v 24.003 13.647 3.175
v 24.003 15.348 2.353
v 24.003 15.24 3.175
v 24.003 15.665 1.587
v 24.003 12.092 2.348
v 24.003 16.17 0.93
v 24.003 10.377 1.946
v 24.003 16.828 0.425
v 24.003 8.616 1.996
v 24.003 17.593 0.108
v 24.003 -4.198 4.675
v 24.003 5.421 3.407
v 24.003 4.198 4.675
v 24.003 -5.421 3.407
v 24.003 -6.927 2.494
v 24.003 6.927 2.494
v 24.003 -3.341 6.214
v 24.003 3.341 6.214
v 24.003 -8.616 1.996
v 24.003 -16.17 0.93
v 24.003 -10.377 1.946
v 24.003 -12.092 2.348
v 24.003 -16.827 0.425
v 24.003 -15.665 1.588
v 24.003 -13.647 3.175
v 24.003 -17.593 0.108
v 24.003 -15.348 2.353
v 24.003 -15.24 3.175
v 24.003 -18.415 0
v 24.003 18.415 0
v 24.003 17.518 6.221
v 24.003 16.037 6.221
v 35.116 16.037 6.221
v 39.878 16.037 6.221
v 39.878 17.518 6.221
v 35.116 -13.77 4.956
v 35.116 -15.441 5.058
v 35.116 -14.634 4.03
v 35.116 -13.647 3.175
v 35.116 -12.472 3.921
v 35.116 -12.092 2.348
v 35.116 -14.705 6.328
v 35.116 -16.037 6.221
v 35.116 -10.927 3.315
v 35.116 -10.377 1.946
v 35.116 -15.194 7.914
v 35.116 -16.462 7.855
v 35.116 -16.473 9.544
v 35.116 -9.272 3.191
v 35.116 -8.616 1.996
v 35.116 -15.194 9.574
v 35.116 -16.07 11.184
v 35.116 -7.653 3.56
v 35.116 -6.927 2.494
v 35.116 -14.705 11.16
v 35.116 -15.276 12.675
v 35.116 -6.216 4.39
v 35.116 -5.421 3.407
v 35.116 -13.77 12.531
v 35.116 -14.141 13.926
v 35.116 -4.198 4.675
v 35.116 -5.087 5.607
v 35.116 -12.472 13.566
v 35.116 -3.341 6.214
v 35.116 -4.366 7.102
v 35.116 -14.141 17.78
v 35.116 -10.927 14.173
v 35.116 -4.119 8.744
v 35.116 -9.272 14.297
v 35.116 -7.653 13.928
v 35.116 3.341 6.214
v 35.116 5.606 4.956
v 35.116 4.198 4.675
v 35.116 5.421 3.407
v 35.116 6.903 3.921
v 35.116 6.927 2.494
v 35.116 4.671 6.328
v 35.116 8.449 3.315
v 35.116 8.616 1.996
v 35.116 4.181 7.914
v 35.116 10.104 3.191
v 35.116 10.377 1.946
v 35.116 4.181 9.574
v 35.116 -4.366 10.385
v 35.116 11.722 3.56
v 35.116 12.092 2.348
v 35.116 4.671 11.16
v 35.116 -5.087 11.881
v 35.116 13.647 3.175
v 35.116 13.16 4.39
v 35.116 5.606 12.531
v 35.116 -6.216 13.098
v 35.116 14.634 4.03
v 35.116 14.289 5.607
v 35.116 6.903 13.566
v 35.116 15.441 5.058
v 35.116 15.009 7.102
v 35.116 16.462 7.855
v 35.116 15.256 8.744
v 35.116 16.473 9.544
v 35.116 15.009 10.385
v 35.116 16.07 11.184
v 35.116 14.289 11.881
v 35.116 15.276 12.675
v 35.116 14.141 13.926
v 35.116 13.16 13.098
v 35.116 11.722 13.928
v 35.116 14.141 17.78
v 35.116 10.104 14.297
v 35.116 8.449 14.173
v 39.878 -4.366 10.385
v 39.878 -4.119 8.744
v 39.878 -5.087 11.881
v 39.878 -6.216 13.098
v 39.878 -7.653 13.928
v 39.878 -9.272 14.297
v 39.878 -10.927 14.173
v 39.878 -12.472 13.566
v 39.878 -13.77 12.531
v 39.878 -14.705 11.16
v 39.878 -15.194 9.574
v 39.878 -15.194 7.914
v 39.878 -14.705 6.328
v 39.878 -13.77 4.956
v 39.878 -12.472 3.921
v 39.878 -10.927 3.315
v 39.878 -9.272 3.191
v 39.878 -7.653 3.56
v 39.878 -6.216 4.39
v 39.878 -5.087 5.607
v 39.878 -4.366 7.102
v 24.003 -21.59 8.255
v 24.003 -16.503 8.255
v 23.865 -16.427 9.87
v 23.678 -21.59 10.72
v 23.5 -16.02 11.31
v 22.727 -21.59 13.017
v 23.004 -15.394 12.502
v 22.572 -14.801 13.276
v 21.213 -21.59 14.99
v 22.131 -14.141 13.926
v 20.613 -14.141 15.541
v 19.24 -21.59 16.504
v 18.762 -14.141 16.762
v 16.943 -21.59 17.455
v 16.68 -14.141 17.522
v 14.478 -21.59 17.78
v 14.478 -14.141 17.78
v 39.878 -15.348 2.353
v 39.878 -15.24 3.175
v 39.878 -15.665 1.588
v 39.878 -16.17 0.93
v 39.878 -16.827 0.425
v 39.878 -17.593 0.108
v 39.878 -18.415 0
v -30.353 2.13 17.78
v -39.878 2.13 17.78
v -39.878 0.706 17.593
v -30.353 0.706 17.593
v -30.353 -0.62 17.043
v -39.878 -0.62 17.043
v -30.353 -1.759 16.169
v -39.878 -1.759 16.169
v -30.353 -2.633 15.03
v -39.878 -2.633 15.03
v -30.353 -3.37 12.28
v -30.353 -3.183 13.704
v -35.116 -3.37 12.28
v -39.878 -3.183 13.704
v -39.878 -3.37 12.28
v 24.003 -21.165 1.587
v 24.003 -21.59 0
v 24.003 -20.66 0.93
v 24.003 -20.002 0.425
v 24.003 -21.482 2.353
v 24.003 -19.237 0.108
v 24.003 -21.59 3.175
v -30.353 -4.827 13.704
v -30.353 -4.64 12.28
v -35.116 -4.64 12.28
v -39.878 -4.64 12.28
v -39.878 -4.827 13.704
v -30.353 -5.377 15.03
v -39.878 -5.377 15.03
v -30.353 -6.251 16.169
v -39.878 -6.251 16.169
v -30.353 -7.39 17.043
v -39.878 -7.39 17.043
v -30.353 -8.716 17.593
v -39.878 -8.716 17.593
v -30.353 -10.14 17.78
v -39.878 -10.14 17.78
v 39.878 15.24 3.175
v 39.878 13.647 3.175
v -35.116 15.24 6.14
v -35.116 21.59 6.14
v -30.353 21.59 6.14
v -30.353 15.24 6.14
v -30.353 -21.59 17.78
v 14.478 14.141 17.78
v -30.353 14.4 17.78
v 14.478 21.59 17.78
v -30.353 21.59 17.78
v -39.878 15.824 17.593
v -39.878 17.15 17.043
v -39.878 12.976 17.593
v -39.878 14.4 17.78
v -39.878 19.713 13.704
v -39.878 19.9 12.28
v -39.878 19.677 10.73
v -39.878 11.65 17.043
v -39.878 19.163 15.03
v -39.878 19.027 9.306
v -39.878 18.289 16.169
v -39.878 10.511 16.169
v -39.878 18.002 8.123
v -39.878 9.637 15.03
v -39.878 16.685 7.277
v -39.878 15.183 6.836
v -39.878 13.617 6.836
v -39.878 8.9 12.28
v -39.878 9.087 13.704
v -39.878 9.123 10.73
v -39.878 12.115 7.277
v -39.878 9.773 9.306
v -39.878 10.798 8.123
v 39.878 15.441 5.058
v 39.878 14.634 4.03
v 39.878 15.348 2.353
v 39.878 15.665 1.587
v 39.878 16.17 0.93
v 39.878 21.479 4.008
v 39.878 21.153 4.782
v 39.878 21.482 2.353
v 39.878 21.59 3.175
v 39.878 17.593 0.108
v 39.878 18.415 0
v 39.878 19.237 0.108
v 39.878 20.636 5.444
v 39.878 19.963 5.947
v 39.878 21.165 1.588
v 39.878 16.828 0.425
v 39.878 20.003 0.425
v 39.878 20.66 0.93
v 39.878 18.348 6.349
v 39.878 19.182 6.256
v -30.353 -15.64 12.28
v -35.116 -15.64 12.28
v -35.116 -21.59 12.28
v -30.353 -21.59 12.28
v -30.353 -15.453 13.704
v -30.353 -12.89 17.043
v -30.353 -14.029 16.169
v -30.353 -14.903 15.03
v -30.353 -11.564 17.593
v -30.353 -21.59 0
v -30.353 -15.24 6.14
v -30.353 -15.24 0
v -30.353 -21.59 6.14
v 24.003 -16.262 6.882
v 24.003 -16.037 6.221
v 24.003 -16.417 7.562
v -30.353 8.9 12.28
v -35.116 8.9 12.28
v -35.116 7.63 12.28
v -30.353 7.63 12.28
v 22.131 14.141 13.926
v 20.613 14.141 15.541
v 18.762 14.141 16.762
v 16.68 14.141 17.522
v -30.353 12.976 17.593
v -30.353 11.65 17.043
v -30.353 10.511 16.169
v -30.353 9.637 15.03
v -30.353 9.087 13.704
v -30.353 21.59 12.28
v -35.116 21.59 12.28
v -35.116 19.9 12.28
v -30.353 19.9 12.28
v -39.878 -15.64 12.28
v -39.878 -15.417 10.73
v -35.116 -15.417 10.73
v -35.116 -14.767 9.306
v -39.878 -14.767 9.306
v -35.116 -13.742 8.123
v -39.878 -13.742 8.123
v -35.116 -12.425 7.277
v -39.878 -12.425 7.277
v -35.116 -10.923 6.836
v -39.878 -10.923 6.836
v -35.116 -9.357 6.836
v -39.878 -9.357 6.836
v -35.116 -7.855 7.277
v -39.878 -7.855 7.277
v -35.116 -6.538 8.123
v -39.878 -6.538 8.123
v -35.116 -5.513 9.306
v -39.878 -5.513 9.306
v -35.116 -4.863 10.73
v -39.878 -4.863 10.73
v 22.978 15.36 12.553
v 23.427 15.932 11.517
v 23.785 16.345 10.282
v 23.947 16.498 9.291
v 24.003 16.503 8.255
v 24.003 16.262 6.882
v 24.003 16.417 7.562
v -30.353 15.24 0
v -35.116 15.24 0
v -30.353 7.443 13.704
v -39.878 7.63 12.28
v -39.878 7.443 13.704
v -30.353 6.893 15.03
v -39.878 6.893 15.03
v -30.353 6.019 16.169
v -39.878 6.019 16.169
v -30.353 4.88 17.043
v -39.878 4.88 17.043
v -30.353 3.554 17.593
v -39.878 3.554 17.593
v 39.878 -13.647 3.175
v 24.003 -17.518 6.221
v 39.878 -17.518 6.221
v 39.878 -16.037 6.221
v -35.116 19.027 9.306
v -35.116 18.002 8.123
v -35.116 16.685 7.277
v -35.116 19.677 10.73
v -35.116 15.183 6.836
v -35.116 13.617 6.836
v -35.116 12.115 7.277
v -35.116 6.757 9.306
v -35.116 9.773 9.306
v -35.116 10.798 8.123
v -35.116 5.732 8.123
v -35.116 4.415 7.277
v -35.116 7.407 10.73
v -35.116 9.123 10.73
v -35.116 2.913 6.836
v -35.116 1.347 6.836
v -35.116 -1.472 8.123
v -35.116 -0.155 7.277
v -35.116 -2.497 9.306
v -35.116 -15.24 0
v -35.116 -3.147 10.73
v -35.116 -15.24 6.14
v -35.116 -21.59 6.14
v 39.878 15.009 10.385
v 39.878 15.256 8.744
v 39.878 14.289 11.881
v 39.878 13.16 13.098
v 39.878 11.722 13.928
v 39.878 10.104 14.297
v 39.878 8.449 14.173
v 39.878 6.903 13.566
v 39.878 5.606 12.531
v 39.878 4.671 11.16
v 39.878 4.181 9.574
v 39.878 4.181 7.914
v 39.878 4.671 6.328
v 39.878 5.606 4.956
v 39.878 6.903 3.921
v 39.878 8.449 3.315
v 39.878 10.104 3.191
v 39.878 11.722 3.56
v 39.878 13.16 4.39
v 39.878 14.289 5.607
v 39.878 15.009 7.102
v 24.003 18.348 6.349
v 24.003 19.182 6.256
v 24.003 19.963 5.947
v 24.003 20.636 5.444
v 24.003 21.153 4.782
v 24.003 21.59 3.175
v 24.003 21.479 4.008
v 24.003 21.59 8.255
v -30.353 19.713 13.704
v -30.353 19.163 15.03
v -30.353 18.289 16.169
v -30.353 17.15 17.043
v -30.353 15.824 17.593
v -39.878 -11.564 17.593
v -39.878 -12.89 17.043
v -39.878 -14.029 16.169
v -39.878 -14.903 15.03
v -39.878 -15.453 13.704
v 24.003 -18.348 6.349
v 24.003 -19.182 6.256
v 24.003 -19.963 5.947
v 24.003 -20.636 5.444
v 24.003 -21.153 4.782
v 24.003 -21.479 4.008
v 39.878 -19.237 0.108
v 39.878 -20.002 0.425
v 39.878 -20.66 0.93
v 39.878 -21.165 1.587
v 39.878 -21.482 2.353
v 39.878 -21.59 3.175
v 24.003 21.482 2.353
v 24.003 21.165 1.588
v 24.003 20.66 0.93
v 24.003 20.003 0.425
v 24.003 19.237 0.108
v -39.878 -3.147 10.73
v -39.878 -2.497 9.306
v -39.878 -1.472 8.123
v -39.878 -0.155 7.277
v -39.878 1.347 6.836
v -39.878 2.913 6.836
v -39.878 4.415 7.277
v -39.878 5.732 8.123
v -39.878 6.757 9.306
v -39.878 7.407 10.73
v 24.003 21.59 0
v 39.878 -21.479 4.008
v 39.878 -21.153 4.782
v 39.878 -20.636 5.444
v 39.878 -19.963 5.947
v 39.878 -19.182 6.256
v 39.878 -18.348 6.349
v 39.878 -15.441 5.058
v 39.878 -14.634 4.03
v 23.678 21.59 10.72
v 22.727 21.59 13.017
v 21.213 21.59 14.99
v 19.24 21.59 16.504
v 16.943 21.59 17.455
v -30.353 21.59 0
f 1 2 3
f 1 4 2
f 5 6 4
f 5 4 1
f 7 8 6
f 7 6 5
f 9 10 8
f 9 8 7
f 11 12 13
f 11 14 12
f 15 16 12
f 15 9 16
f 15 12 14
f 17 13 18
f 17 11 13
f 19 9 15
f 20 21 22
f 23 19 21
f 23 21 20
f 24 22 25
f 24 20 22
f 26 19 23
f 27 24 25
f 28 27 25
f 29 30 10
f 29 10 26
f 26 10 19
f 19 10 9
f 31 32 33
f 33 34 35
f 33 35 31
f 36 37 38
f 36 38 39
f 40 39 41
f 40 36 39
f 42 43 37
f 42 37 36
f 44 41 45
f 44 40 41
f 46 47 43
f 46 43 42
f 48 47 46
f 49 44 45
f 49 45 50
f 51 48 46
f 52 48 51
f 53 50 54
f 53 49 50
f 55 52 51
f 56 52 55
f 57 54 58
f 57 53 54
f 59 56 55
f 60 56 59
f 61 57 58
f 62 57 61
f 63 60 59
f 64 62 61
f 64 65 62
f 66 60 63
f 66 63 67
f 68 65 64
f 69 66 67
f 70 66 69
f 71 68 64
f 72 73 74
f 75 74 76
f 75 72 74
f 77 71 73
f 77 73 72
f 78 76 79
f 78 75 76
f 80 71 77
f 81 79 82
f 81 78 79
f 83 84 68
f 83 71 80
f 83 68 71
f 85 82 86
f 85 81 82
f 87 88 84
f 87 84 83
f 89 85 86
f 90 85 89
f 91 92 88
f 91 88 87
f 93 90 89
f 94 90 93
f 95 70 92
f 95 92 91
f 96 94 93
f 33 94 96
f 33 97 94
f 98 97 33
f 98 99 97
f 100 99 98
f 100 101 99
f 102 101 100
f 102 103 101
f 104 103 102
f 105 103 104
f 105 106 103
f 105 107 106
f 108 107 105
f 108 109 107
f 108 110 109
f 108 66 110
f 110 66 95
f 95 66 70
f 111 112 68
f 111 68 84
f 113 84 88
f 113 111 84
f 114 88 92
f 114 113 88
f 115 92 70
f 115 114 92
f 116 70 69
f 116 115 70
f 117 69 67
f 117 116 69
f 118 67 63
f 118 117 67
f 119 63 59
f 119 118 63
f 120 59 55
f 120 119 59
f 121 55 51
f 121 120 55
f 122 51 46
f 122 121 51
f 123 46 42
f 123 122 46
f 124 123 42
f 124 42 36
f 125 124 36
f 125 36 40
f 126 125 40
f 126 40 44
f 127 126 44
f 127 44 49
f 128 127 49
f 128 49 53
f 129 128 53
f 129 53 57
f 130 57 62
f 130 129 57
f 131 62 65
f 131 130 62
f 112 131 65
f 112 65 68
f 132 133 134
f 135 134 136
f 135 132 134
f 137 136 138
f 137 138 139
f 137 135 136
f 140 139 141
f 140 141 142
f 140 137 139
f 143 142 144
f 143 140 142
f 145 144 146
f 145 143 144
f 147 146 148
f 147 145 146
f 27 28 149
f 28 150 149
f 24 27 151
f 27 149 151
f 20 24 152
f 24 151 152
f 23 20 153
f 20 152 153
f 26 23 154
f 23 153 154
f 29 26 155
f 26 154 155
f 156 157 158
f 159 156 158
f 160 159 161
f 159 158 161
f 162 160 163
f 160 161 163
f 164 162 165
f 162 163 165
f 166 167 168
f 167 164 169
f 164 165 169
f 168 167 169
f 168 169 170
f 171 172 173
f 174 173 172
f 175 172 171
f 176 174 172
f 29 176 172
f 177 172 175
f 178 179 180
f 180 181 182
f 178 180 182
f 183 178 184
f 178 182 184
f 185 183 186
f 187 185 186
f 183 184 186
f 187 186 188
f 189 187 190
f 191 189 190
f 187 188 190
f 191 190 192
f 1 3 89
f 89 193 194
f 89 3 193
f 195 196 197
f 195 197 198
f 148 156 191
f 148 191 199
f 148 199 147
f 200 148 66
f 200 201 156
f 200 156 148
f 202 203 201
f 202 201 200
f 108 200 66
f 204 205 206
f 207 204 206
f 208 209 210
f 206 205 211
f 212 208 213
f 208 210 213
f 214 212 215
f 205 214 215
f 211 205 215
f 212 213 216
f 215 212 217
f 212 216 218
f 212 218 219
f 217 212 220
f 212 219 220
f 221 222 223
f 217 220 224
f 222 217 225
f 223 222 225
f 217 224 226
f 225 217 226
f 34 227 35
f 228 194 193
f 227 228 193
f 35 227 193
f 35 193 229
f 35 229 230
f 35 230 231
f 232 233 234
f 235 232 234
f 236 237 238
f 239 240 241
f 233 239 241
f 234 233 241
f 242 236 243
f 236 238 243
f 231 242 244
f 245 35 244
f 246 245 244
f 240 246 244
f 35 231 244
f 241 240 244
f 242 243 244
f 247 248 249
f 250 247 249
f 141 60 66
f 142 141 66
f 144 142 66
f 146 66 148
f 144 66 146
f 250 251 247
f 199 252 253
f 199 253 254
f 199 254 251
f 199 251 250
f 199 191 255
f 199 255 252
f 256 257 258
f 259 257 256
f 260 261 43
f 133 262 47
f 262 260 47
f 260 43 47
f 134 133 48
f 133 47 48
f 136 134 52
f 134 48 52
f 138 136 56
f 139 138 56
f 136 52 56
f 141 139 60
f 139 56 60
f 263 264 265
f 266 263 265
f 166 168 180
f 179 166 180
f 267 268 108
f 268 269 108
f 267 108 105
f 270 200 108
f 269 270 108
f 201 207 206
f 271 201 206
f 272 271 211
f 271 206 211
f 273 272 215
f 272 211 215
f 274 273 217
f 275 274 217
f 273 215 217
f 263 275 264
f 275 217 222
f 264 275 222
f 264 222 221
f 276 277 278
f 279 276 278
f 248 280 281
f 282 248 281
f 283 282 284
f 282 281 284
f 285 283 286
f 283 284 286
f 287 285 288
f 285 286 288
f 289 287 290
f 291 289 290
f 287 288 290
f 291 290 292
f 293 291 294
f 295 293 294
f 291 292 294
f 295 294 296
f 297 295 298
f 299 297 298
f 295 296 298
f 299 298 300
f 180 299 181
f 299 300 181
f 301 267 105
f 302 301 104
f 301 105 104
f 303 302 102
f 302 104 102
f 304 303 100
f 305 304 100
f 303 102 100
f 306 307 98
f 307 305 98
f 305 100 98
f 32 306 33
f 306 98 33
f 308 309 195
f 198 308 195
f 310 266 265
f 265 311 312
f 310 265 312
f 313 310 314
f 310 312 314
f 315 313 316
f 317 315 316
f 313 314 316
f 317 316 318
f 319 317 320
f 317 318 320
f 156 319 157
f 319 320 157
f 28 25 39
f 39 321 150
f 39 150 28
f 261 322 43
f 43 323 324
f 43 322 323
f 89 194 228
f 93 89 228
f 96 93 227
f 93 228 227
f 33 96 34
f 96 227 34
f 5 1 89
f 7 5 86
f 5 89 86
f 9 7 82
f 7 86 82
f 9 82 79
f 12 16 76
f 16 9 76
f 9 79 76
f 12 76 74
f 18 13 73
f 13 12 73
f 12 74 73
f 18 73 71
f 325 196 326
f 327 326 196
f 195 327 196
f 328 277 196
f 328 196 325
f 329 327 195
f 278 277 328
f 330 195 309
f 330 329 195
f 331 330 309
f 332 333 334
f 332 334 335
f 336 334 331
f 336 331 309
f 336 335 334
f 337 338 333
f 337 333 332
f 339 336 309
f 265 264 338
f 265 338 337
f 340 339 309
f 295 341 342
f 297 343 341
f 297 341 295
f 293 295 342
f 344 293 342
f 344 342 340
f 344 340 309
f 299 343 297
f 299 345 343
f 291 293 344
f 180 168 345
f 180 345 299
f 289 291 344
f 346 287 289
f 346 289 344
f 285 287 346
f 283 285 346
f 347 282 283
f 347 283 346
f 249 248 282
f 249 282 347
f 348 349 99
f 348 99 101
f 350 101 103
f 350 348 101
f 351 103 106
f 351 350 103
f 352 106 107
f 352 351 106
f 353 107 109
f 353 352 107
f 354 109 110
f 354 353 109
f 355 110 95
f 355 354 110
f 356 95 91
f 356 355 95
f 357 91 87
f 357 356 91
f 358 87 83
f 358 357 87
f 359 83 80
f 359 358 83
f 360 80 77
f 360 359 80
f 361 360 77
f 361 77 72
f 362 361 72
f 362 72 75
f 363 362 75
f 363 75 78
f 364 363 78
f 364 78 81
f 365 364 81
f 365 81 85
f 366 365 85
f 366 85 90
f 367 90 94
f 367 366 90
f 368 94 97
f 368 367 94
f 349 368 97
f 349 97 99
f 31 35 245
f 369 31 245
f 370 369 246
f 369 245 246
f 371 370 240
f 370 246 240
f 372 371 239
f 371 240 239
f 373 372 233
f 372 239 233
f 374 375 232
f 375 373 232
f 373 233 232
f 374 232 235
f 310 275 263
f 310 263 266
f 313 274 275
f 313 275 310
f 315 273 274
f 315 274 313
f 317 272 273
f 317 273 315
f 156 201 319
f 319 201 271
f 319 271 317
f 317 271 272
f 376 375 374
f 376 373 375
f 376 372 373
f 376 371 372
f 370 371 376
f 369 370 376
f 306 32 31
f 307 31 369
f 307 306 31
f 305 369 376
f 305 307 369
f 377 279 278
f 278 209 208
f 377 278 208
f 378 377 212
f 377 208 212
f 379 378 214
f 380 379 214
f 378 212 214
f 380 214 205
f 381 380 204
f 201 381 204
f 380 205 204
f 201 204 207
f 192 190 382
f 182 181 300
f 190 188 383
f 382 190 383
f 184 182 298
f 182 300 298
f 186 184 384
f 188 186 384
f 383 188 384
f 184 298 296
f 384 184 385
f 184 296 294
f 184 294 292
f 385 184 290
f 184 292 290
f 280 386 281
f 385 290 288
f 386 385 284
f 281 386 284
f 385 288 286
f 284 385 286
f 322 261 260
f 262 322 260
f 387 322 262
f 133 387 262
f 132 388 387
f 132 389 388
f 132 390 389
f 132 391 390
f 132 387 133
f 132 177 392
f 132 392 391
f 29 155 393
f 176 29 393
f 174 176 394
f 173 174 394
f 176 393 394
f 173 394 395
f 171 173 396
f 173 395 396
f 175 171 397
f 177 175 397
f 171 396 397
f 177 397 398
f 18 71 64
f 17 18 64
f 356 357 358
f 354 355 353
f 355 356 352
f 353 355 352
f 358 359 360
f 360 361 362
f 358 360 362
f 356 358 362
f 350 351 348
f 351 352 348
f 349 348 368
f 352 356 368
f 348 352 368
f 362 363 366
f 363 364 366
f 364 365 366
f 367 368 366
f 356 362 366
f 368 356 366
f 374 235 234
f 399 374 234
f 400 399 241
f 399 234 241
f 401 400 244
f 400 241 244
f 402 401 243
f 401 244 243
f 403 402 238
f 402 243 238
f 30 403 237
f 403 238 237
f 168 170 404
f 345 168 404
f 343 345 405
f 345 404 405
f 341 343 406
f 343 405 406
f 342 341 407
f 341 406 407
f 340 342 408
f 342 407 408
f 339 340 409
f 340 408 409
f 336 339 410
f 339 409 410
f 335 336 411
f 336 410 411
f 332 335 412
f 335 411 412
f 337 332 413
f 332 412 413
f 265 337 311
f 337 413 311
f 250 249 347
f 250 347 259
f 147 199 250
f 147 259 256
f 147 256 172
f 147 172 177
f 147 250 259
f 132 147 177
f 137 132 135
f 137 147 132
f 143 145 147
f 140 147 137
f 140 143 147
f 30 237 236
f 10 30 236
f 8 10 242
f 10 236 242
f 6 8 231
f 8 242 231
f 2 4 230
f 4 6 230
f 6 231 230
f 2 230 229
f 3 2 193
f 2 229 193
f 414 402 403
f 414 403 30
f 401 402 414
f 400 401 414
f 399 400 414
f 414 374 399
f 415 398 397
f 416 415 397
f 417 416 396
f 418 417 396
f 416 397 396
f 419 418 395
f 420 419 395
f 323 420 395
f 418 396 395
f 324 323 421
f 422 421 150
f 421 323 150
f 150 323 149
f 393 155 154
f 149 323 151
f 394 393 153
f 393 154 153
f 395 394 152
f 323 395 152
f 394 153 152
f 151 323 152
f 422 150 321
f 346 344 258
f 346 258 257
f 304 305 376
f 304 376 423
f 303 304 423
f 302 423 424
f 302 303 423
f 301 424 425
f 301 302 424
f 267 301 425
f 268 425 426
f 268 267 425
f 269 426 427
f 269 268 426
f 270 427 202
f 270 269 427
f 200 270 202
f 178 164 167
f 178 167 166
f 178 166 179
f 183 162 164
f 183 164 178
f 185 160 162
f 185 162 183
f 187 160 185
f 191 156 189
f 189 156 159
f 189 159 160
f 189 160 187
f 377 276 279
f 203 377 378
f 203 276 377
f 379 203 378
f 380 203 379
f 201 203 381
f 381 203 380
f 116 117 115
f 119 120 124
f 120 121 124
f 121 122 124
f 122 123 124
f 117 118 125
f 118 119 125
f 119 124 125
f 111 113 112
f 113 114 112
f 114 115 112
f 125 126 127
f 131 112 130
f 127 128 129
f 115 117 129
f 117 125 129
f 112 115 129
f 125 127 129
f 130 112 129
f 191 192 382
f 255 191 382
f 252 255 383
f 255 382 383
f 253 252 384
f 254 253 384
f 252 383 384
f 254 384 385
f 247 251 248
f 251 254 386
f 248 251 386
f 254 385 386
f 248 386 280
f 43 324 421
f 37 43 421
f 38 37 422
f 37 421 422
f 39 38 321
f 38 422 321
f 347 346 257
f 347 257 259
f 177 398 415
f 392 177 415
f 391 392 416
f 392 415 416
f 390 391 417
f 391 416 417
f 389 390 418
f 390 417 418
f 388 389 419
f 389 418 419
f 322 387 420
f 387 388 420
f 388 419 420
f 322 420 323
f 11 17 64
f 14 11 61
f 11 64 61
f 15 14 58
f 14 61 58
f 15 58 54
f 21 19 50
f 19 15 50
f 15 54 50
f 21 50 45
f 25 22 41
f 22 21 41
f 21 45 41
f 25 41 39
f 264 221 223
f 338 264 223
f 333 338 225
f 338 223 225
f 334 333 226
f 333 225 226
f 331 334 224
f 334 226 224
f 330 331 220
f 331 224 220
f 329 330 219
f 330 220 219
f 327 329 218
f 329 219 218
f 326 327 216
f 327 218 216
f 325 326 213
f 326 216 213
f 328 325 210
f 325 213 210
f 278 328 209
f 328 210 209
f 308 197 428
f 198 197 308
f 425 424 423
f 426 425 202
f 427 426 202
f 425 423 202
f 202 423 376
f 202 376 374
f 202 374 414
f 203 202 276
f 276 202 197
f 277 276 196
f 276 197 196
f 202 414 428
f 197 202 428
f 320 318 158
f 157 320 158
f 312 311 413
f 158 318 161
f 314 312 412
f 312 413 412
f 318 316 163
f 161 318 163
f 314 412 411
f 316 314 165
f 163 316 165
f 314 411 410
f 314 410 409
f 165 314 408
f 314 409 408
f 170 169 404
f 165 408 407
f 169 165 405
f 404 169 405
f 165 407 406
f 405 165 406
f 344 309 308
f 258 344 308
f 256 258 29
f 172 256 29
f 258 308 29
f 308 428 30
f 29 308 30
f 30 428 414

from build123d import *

# Parameters (mm, degrees)
F1_DEPTH  = 17.78
F2_W      = 6.35
F2_H      = 6.1400055
F3_DEPTH  = 9.525
F2_W_2    = 30.48
F4_DEPTH  = 4.7625
F5_R      = 5.5687296145
F6_DEPTH  = 4.7625
F7_DEPTH  = 17.4625
F8_DEPTH  = 25.4
F9_DEPTH  = 15.875
F10_W     = 9.525
F10_H     = 5.08
F10_H_2   = 3.175
F11_DEPTH = 43.18


# Not quite as in the source:
# - a length typed as a fraction of an inch, garbled in the dataset ("3 / 203.2 mm" for 3/8 in), is restored
# - a feature names something its author has since deleted; it is built from what else it names


with BuildPart() as f1:
    # F0 (on Top) → F1 (new body)
    with BuildSketch(Plane.XY):
        Polygon((-39.878, 21.59), (-39.878, 0), (-39.878, -21.59), (39.878, -21.59), (39.878, 0), (39.878, 21.59), align=None)
    extrude(amount=F1_DEPTH)

    # F2 (on face) → F3 (cut)
    with BuildSketch(Plane(origin=(-39.878, 0, 0), x_dir=(0, -1, 0), z_dir=(-1, 0, 0))):
        with Locations((-18.415, 3.07000275)):
            Rectangle(F2_W, F2_H)
        with Locations((18.415, 3.07000275)):
            Rectangle(F2_W, F2_H)
        with BuildLine():
            Line((-21.59, 17.78), (-21.59, 12.28))
            Line((-21.59, 12.28), (-19.9, 12.28))
            ThreePointArc((-19.9, 12.28), (-18.2890872965, 16.1690872965), (-14.4, 17.78))
            Line((-14.4, 17.78), (-21.59, 17.78))
        make_face()
        with BuildLine():
            Line((-2.13, 17.78), (-14.4, 17.78))
            ThreePointArc((-14.4, 17.78), (-10.5109127035, 16.1690872965), (-8.9, 12.28))
            Line((-8.9, 12.28), (-7.63, 12.28))
            ThreePointArc((-7.63, 12.28), (-6.0190872965, 16.1690872965), (-2.13, 17.78))
        make_face()
        with BuildLine():
            Line((15.64, 12.28), (21.59, 12.28))
            Line((21.59, 12.28), (21.59, 17.78))
            Line((21.59, 17.78), (10.14, 17.78))
            ThreePointArc((10.14, 17.78), (14.0290872965, 16.1690872965), (15.64, 12.28))
        make_face()
        with BuildLine():
            Line((10.14, 17.78), (-2.13, 17.78))
            ThreePointArc((-2.13, 17.78), (1.7590872965, 16.1690872965), (3.37, 12.28))
            Line((3.37, 12.28), (4.64, 12.28))
            ThreePointArc((4.64, 12.28), (6.2509127035, 16.1690872965), (10.14, 17.78))
        make_face()
    extrude(amount=-F3_DEPTH, mode=Mode.SUBTRACT)

    # F2 (on face) → F4 (cut)
    with BuildSketch(Plane(origin=(-39.878, 0, 0), x_dir=(0, -1, 0), z_dir=(-1, 0, 0))):
        with Locations((0, 3.07000275)):
            Rectangle(F2_W_2, F2_H)
        with BuildLine():
            Line((-21.59, 12.28), (-21.59, 6.1400055))
            Line((-21.59, 6.1400055), (-15.24, 6.1400055))
            Line((-15.24, 6.1400055), (15.24, 6.1400055))
            Line((15.24, 6.1400055), (21.59, 6.1400055))
            Line((21.59, 6.1400055), (21.59, 12.28))
            Line((21.59, 12.28), (15.64, 12.28))
            ThreePointArc((15.64, 12.28), (10.14, 6.78), (4.64, 12.28))
            Line((4.64, 12.28), (3.37, 12.28))
            ThreePointArc((3.37, 12.28), (-2.13, 6.78), (-7.63, 12.28))
            Line((-7.63, 12.28), (-8.9, 12.28))
            ThreePointArc((-8.9, 12.28), (-14.4, 6.78), (-19.9, 12.28))
            Line((-19.9, 12.28), (-21.59, 12.28))
        make_face()
    extrude(amount=-F4_DEPTH, mode=Mode.SUBTRACT)

    # F5 (on face) → F6 (cut)
    with BuildSketch(Plane.YZ.offset(39.878)):
        with BuildLine():
            Line((14.1410236641, 17.78), (-14.1410236641, 17.78))
            Line((-14.1410236641, 17.78), (-14.1410236641, 13.925705291))
            ThreePointArc((-14.1410236641, 13.925705291), (-8.0583664109, 15.3792022386), (-3.3407865054, 11.2736191532))
            Line((-3.3407865054, 11.2736191532), (3.3407865054, 11.2736191532))
            ThreePointArc((3.3407865054, 11.2736191532), (8.0583664109, 15.3792022386), (14.1410236641, 13.925705291))
            Line((14.1410236641, 13.925705291), (14.1410236641, 17.78))
        make_face()
        with BuildLine():
            ThreePointArc((-14.1410236641, 13.925705291), (-16.3223765845, 10.3766090016), (-16.0373890971, 6.2205090068))
            ThreePointArc((-16.0373890971, 6.2205090068), (-15.0623054432, 4.5248800343), (-13.6467597401, 3.175))
            ThreePointArc((-13.6467597401, 3.175), (-7.7553416056, 2.1900909973), (-3.3407865054, 6.2138400758))
            Line((-3.3407865054, 6.2138400758), (3.3407865054, 6.2138400758))
            ThreePointArc((3.3407865054, 6.2138400758), (7.7553416056, 2.1900909973), (13.6467597401, 3.175))
            ThreePointArc((13.6467597401, 3.175), (15.0623054432, 4.5248800343), (16.0373890971, 6.2205090068))
            ThreePointArc((16.0373890971, 6.2205090068), (16.3223765845, 10.3766090016), (14.1410236641, 13.925705291))
            ThreePointArc((14.1410236641, 13.925705291), (8.0583664109, 15.3792022386), (3.3407865054, 11.2736191532))
            Line((3.3407865054, 11.2736191532), (-3.3407865054, 11.2736191532))
            ThreePointArc((-3.3407865054, 11.2736191532), (-8.0583664109, 15.3792022386), (-14.1410236641, 13.925705291))
        make_face()
        with Locations((-9.6877607201, 8.7437296145)):
            Circle(F5_R, mode=Mode.SUBTRACT)
        with Locations((9.6877607201, 8.7437296145)):
            Circle(F5_R, mode=Mode.SUBTRACT)
    extrude(amount=-F6_DEPTH, mode=Mode.SUBTRACT)

    # F5 (on face) → F7 (cut)
    with BuildSketch(Plane.YZ.offset(39.878)):
        with BuildLine():
            ThreePointArc((-15.24, 3.175), (-16.1699359684, 0.9299359711), (-18.4149999962, 0))
            Line((-18.4149999962, 0), (-12.0420521125, 0))
            Line((-12.0420521125, 0), (18.41500001, 0))
            ThreePointArc((18.41500001, 0), (16.1699359733, 0.9299359662), (15.24, 3.175))
            Line((15.24, 3.175), (13.6467597401, 3.175))
            ThreePointArc((13.6467597401, 3.175), (7.7553416056, 2.1900909973), (3.3407865054, 6.2138400758))
            Line((3.3407865054, 6.2138400758), (-3.3407865054, 6.2138400758))
            ThreePointArc((-3.3407865054, 6.2138400758), (-7.7553416056, 2.1900909973), (-13.6467597401, 3.175))
            Line((-13.6467597401, 3.175), (-15.24, 3.175))
        make_face()
    extrude(amount=-F7_DEPTH, mode=Mode.SUBTRACT)

    # F5 (on face) → F8 (cut)
    with BuildSketch(Plane.YZ.offset(39.878)):
        with BuildLine():
            Line((-21.59, 17.78), (-21.59, 3.175))
            ThreePointArc((-21.59, 3.175), (-20.3164565142, 5.7176537563), (-17.5175035436, 6.2205090068))
            Line((-17.5175035436, 6.2205090068), (-16.0373890971, 6.2205090068))
            ThreePointArc((-16.0373890971, 6.2205090068), (-16.3223765845, 10.3766090016), (-14.1410236641, 13.925705291))
            Line((-14.1410236641, 13.925705291), (-14.1410236641, 17.78))
            Line((-14.1410236641, 17.78), (-21.59, 17.78))
        make_face()
        with BuildLine():
            Line((21.59, 17.78), (14.1410236641, 17.78))
            Line((14.1410236641, 17.78), (14.1410236641, 13.925705291))
            ThreePointArc((14.1410236641, 13.925705291), (16.3223765845, 10.3766090016), (16.0373890971, 6.2205090068))
            Line((16.0373890971, 6.2205090068), (17.5175035436, 6.2205090068))
            ThreePointArc((17.5175035436, 6.2205090068), (20.3164565142, 5.7176537563), (21.59, 3.175))
            Line((21.59, 3.175), (21.59, 17.78))
        make_face()
    extrude(amount=-F8_DEPTH, mode=Mode.SUBTRACT)

    # F5 (on face) → F9 (cut)
    with BuildSketch(Plane.YZ.offset(39.878)):
        with BuildLine():
            Line((-21.59, 3.175), (-21.59, 0))
            Line((-21.59, 0), (-18.4149999962, 0))
            ThreePointArc((-18.4149999962, 0), (-20.6600640289, 0.9299359684), (-21.59, 3.175))
        make_face()
        with BuildLine():
            ThreePointArc((-15.24, 3.175), (-16.1699359684, 0.9299359711), (-18.4149999962, 0))
            Line((-18.4149999962, 0), (-12.0420521125, 0))
            Line((-12.0420521125, 0), (18.41500001, 0))
            ThreePointArc((18.41500001, 0), (16.1699359733, 0.9299359662), (15.24, 3.175))
            Line((15.24, 3.175), (13.6467597401, 3.175))
            ThreePointArc((13.6467597401, 3.175), (7.7553416056, 2.1900909973), (3.3407865054, 6.2138400758))
            Line((3.3407865054, 6.2138400758), (-3.3407865054, 6.2138400758))
            ThreePointArc((-3.3407865054, 6.2138400758), (-7.7553416056, 2.1900909973), (-13.6467597401, 3.175))
            Line((-13.6467597401, 3.175), (-15.24, 3.175))
        make_face()
        with BuildLine():
            ThreePointArc((21.59, 3.175), (20.6600640338, 0.9299359733), (18.41500001, 0))
            Line((18.41500001, 0), (21.59, 0))
            Line((21.59, 0), (21.59, 3.175))
        make_face()
    extrude(amount=-F9_DEPTH, mode=Mode.SUBTRACT)

    # F10 (on face) → F11 (join)
    with BuildSketch(Plane.XZ.offset(21.59)):
        with BuildLine():
            ThreePointArc((24.003, 8.255), (21.2131920908, 14.9901920908), (14.478, 17.78))
            Line((14.478, 17.78), (14.478, 8.255))
            Line((14.478, 8.255), (24.003, 8.255))
        make_face()
        with Locations((19.2405, 5.715)):
            Rectangle(F10_W, F10_H)
        with Locations((19.2405, 1.5875)):
            Rectangle(F10_W, F10_H_2)
    extrude(amount=-F11_DEPTH)


solid = f1.part
